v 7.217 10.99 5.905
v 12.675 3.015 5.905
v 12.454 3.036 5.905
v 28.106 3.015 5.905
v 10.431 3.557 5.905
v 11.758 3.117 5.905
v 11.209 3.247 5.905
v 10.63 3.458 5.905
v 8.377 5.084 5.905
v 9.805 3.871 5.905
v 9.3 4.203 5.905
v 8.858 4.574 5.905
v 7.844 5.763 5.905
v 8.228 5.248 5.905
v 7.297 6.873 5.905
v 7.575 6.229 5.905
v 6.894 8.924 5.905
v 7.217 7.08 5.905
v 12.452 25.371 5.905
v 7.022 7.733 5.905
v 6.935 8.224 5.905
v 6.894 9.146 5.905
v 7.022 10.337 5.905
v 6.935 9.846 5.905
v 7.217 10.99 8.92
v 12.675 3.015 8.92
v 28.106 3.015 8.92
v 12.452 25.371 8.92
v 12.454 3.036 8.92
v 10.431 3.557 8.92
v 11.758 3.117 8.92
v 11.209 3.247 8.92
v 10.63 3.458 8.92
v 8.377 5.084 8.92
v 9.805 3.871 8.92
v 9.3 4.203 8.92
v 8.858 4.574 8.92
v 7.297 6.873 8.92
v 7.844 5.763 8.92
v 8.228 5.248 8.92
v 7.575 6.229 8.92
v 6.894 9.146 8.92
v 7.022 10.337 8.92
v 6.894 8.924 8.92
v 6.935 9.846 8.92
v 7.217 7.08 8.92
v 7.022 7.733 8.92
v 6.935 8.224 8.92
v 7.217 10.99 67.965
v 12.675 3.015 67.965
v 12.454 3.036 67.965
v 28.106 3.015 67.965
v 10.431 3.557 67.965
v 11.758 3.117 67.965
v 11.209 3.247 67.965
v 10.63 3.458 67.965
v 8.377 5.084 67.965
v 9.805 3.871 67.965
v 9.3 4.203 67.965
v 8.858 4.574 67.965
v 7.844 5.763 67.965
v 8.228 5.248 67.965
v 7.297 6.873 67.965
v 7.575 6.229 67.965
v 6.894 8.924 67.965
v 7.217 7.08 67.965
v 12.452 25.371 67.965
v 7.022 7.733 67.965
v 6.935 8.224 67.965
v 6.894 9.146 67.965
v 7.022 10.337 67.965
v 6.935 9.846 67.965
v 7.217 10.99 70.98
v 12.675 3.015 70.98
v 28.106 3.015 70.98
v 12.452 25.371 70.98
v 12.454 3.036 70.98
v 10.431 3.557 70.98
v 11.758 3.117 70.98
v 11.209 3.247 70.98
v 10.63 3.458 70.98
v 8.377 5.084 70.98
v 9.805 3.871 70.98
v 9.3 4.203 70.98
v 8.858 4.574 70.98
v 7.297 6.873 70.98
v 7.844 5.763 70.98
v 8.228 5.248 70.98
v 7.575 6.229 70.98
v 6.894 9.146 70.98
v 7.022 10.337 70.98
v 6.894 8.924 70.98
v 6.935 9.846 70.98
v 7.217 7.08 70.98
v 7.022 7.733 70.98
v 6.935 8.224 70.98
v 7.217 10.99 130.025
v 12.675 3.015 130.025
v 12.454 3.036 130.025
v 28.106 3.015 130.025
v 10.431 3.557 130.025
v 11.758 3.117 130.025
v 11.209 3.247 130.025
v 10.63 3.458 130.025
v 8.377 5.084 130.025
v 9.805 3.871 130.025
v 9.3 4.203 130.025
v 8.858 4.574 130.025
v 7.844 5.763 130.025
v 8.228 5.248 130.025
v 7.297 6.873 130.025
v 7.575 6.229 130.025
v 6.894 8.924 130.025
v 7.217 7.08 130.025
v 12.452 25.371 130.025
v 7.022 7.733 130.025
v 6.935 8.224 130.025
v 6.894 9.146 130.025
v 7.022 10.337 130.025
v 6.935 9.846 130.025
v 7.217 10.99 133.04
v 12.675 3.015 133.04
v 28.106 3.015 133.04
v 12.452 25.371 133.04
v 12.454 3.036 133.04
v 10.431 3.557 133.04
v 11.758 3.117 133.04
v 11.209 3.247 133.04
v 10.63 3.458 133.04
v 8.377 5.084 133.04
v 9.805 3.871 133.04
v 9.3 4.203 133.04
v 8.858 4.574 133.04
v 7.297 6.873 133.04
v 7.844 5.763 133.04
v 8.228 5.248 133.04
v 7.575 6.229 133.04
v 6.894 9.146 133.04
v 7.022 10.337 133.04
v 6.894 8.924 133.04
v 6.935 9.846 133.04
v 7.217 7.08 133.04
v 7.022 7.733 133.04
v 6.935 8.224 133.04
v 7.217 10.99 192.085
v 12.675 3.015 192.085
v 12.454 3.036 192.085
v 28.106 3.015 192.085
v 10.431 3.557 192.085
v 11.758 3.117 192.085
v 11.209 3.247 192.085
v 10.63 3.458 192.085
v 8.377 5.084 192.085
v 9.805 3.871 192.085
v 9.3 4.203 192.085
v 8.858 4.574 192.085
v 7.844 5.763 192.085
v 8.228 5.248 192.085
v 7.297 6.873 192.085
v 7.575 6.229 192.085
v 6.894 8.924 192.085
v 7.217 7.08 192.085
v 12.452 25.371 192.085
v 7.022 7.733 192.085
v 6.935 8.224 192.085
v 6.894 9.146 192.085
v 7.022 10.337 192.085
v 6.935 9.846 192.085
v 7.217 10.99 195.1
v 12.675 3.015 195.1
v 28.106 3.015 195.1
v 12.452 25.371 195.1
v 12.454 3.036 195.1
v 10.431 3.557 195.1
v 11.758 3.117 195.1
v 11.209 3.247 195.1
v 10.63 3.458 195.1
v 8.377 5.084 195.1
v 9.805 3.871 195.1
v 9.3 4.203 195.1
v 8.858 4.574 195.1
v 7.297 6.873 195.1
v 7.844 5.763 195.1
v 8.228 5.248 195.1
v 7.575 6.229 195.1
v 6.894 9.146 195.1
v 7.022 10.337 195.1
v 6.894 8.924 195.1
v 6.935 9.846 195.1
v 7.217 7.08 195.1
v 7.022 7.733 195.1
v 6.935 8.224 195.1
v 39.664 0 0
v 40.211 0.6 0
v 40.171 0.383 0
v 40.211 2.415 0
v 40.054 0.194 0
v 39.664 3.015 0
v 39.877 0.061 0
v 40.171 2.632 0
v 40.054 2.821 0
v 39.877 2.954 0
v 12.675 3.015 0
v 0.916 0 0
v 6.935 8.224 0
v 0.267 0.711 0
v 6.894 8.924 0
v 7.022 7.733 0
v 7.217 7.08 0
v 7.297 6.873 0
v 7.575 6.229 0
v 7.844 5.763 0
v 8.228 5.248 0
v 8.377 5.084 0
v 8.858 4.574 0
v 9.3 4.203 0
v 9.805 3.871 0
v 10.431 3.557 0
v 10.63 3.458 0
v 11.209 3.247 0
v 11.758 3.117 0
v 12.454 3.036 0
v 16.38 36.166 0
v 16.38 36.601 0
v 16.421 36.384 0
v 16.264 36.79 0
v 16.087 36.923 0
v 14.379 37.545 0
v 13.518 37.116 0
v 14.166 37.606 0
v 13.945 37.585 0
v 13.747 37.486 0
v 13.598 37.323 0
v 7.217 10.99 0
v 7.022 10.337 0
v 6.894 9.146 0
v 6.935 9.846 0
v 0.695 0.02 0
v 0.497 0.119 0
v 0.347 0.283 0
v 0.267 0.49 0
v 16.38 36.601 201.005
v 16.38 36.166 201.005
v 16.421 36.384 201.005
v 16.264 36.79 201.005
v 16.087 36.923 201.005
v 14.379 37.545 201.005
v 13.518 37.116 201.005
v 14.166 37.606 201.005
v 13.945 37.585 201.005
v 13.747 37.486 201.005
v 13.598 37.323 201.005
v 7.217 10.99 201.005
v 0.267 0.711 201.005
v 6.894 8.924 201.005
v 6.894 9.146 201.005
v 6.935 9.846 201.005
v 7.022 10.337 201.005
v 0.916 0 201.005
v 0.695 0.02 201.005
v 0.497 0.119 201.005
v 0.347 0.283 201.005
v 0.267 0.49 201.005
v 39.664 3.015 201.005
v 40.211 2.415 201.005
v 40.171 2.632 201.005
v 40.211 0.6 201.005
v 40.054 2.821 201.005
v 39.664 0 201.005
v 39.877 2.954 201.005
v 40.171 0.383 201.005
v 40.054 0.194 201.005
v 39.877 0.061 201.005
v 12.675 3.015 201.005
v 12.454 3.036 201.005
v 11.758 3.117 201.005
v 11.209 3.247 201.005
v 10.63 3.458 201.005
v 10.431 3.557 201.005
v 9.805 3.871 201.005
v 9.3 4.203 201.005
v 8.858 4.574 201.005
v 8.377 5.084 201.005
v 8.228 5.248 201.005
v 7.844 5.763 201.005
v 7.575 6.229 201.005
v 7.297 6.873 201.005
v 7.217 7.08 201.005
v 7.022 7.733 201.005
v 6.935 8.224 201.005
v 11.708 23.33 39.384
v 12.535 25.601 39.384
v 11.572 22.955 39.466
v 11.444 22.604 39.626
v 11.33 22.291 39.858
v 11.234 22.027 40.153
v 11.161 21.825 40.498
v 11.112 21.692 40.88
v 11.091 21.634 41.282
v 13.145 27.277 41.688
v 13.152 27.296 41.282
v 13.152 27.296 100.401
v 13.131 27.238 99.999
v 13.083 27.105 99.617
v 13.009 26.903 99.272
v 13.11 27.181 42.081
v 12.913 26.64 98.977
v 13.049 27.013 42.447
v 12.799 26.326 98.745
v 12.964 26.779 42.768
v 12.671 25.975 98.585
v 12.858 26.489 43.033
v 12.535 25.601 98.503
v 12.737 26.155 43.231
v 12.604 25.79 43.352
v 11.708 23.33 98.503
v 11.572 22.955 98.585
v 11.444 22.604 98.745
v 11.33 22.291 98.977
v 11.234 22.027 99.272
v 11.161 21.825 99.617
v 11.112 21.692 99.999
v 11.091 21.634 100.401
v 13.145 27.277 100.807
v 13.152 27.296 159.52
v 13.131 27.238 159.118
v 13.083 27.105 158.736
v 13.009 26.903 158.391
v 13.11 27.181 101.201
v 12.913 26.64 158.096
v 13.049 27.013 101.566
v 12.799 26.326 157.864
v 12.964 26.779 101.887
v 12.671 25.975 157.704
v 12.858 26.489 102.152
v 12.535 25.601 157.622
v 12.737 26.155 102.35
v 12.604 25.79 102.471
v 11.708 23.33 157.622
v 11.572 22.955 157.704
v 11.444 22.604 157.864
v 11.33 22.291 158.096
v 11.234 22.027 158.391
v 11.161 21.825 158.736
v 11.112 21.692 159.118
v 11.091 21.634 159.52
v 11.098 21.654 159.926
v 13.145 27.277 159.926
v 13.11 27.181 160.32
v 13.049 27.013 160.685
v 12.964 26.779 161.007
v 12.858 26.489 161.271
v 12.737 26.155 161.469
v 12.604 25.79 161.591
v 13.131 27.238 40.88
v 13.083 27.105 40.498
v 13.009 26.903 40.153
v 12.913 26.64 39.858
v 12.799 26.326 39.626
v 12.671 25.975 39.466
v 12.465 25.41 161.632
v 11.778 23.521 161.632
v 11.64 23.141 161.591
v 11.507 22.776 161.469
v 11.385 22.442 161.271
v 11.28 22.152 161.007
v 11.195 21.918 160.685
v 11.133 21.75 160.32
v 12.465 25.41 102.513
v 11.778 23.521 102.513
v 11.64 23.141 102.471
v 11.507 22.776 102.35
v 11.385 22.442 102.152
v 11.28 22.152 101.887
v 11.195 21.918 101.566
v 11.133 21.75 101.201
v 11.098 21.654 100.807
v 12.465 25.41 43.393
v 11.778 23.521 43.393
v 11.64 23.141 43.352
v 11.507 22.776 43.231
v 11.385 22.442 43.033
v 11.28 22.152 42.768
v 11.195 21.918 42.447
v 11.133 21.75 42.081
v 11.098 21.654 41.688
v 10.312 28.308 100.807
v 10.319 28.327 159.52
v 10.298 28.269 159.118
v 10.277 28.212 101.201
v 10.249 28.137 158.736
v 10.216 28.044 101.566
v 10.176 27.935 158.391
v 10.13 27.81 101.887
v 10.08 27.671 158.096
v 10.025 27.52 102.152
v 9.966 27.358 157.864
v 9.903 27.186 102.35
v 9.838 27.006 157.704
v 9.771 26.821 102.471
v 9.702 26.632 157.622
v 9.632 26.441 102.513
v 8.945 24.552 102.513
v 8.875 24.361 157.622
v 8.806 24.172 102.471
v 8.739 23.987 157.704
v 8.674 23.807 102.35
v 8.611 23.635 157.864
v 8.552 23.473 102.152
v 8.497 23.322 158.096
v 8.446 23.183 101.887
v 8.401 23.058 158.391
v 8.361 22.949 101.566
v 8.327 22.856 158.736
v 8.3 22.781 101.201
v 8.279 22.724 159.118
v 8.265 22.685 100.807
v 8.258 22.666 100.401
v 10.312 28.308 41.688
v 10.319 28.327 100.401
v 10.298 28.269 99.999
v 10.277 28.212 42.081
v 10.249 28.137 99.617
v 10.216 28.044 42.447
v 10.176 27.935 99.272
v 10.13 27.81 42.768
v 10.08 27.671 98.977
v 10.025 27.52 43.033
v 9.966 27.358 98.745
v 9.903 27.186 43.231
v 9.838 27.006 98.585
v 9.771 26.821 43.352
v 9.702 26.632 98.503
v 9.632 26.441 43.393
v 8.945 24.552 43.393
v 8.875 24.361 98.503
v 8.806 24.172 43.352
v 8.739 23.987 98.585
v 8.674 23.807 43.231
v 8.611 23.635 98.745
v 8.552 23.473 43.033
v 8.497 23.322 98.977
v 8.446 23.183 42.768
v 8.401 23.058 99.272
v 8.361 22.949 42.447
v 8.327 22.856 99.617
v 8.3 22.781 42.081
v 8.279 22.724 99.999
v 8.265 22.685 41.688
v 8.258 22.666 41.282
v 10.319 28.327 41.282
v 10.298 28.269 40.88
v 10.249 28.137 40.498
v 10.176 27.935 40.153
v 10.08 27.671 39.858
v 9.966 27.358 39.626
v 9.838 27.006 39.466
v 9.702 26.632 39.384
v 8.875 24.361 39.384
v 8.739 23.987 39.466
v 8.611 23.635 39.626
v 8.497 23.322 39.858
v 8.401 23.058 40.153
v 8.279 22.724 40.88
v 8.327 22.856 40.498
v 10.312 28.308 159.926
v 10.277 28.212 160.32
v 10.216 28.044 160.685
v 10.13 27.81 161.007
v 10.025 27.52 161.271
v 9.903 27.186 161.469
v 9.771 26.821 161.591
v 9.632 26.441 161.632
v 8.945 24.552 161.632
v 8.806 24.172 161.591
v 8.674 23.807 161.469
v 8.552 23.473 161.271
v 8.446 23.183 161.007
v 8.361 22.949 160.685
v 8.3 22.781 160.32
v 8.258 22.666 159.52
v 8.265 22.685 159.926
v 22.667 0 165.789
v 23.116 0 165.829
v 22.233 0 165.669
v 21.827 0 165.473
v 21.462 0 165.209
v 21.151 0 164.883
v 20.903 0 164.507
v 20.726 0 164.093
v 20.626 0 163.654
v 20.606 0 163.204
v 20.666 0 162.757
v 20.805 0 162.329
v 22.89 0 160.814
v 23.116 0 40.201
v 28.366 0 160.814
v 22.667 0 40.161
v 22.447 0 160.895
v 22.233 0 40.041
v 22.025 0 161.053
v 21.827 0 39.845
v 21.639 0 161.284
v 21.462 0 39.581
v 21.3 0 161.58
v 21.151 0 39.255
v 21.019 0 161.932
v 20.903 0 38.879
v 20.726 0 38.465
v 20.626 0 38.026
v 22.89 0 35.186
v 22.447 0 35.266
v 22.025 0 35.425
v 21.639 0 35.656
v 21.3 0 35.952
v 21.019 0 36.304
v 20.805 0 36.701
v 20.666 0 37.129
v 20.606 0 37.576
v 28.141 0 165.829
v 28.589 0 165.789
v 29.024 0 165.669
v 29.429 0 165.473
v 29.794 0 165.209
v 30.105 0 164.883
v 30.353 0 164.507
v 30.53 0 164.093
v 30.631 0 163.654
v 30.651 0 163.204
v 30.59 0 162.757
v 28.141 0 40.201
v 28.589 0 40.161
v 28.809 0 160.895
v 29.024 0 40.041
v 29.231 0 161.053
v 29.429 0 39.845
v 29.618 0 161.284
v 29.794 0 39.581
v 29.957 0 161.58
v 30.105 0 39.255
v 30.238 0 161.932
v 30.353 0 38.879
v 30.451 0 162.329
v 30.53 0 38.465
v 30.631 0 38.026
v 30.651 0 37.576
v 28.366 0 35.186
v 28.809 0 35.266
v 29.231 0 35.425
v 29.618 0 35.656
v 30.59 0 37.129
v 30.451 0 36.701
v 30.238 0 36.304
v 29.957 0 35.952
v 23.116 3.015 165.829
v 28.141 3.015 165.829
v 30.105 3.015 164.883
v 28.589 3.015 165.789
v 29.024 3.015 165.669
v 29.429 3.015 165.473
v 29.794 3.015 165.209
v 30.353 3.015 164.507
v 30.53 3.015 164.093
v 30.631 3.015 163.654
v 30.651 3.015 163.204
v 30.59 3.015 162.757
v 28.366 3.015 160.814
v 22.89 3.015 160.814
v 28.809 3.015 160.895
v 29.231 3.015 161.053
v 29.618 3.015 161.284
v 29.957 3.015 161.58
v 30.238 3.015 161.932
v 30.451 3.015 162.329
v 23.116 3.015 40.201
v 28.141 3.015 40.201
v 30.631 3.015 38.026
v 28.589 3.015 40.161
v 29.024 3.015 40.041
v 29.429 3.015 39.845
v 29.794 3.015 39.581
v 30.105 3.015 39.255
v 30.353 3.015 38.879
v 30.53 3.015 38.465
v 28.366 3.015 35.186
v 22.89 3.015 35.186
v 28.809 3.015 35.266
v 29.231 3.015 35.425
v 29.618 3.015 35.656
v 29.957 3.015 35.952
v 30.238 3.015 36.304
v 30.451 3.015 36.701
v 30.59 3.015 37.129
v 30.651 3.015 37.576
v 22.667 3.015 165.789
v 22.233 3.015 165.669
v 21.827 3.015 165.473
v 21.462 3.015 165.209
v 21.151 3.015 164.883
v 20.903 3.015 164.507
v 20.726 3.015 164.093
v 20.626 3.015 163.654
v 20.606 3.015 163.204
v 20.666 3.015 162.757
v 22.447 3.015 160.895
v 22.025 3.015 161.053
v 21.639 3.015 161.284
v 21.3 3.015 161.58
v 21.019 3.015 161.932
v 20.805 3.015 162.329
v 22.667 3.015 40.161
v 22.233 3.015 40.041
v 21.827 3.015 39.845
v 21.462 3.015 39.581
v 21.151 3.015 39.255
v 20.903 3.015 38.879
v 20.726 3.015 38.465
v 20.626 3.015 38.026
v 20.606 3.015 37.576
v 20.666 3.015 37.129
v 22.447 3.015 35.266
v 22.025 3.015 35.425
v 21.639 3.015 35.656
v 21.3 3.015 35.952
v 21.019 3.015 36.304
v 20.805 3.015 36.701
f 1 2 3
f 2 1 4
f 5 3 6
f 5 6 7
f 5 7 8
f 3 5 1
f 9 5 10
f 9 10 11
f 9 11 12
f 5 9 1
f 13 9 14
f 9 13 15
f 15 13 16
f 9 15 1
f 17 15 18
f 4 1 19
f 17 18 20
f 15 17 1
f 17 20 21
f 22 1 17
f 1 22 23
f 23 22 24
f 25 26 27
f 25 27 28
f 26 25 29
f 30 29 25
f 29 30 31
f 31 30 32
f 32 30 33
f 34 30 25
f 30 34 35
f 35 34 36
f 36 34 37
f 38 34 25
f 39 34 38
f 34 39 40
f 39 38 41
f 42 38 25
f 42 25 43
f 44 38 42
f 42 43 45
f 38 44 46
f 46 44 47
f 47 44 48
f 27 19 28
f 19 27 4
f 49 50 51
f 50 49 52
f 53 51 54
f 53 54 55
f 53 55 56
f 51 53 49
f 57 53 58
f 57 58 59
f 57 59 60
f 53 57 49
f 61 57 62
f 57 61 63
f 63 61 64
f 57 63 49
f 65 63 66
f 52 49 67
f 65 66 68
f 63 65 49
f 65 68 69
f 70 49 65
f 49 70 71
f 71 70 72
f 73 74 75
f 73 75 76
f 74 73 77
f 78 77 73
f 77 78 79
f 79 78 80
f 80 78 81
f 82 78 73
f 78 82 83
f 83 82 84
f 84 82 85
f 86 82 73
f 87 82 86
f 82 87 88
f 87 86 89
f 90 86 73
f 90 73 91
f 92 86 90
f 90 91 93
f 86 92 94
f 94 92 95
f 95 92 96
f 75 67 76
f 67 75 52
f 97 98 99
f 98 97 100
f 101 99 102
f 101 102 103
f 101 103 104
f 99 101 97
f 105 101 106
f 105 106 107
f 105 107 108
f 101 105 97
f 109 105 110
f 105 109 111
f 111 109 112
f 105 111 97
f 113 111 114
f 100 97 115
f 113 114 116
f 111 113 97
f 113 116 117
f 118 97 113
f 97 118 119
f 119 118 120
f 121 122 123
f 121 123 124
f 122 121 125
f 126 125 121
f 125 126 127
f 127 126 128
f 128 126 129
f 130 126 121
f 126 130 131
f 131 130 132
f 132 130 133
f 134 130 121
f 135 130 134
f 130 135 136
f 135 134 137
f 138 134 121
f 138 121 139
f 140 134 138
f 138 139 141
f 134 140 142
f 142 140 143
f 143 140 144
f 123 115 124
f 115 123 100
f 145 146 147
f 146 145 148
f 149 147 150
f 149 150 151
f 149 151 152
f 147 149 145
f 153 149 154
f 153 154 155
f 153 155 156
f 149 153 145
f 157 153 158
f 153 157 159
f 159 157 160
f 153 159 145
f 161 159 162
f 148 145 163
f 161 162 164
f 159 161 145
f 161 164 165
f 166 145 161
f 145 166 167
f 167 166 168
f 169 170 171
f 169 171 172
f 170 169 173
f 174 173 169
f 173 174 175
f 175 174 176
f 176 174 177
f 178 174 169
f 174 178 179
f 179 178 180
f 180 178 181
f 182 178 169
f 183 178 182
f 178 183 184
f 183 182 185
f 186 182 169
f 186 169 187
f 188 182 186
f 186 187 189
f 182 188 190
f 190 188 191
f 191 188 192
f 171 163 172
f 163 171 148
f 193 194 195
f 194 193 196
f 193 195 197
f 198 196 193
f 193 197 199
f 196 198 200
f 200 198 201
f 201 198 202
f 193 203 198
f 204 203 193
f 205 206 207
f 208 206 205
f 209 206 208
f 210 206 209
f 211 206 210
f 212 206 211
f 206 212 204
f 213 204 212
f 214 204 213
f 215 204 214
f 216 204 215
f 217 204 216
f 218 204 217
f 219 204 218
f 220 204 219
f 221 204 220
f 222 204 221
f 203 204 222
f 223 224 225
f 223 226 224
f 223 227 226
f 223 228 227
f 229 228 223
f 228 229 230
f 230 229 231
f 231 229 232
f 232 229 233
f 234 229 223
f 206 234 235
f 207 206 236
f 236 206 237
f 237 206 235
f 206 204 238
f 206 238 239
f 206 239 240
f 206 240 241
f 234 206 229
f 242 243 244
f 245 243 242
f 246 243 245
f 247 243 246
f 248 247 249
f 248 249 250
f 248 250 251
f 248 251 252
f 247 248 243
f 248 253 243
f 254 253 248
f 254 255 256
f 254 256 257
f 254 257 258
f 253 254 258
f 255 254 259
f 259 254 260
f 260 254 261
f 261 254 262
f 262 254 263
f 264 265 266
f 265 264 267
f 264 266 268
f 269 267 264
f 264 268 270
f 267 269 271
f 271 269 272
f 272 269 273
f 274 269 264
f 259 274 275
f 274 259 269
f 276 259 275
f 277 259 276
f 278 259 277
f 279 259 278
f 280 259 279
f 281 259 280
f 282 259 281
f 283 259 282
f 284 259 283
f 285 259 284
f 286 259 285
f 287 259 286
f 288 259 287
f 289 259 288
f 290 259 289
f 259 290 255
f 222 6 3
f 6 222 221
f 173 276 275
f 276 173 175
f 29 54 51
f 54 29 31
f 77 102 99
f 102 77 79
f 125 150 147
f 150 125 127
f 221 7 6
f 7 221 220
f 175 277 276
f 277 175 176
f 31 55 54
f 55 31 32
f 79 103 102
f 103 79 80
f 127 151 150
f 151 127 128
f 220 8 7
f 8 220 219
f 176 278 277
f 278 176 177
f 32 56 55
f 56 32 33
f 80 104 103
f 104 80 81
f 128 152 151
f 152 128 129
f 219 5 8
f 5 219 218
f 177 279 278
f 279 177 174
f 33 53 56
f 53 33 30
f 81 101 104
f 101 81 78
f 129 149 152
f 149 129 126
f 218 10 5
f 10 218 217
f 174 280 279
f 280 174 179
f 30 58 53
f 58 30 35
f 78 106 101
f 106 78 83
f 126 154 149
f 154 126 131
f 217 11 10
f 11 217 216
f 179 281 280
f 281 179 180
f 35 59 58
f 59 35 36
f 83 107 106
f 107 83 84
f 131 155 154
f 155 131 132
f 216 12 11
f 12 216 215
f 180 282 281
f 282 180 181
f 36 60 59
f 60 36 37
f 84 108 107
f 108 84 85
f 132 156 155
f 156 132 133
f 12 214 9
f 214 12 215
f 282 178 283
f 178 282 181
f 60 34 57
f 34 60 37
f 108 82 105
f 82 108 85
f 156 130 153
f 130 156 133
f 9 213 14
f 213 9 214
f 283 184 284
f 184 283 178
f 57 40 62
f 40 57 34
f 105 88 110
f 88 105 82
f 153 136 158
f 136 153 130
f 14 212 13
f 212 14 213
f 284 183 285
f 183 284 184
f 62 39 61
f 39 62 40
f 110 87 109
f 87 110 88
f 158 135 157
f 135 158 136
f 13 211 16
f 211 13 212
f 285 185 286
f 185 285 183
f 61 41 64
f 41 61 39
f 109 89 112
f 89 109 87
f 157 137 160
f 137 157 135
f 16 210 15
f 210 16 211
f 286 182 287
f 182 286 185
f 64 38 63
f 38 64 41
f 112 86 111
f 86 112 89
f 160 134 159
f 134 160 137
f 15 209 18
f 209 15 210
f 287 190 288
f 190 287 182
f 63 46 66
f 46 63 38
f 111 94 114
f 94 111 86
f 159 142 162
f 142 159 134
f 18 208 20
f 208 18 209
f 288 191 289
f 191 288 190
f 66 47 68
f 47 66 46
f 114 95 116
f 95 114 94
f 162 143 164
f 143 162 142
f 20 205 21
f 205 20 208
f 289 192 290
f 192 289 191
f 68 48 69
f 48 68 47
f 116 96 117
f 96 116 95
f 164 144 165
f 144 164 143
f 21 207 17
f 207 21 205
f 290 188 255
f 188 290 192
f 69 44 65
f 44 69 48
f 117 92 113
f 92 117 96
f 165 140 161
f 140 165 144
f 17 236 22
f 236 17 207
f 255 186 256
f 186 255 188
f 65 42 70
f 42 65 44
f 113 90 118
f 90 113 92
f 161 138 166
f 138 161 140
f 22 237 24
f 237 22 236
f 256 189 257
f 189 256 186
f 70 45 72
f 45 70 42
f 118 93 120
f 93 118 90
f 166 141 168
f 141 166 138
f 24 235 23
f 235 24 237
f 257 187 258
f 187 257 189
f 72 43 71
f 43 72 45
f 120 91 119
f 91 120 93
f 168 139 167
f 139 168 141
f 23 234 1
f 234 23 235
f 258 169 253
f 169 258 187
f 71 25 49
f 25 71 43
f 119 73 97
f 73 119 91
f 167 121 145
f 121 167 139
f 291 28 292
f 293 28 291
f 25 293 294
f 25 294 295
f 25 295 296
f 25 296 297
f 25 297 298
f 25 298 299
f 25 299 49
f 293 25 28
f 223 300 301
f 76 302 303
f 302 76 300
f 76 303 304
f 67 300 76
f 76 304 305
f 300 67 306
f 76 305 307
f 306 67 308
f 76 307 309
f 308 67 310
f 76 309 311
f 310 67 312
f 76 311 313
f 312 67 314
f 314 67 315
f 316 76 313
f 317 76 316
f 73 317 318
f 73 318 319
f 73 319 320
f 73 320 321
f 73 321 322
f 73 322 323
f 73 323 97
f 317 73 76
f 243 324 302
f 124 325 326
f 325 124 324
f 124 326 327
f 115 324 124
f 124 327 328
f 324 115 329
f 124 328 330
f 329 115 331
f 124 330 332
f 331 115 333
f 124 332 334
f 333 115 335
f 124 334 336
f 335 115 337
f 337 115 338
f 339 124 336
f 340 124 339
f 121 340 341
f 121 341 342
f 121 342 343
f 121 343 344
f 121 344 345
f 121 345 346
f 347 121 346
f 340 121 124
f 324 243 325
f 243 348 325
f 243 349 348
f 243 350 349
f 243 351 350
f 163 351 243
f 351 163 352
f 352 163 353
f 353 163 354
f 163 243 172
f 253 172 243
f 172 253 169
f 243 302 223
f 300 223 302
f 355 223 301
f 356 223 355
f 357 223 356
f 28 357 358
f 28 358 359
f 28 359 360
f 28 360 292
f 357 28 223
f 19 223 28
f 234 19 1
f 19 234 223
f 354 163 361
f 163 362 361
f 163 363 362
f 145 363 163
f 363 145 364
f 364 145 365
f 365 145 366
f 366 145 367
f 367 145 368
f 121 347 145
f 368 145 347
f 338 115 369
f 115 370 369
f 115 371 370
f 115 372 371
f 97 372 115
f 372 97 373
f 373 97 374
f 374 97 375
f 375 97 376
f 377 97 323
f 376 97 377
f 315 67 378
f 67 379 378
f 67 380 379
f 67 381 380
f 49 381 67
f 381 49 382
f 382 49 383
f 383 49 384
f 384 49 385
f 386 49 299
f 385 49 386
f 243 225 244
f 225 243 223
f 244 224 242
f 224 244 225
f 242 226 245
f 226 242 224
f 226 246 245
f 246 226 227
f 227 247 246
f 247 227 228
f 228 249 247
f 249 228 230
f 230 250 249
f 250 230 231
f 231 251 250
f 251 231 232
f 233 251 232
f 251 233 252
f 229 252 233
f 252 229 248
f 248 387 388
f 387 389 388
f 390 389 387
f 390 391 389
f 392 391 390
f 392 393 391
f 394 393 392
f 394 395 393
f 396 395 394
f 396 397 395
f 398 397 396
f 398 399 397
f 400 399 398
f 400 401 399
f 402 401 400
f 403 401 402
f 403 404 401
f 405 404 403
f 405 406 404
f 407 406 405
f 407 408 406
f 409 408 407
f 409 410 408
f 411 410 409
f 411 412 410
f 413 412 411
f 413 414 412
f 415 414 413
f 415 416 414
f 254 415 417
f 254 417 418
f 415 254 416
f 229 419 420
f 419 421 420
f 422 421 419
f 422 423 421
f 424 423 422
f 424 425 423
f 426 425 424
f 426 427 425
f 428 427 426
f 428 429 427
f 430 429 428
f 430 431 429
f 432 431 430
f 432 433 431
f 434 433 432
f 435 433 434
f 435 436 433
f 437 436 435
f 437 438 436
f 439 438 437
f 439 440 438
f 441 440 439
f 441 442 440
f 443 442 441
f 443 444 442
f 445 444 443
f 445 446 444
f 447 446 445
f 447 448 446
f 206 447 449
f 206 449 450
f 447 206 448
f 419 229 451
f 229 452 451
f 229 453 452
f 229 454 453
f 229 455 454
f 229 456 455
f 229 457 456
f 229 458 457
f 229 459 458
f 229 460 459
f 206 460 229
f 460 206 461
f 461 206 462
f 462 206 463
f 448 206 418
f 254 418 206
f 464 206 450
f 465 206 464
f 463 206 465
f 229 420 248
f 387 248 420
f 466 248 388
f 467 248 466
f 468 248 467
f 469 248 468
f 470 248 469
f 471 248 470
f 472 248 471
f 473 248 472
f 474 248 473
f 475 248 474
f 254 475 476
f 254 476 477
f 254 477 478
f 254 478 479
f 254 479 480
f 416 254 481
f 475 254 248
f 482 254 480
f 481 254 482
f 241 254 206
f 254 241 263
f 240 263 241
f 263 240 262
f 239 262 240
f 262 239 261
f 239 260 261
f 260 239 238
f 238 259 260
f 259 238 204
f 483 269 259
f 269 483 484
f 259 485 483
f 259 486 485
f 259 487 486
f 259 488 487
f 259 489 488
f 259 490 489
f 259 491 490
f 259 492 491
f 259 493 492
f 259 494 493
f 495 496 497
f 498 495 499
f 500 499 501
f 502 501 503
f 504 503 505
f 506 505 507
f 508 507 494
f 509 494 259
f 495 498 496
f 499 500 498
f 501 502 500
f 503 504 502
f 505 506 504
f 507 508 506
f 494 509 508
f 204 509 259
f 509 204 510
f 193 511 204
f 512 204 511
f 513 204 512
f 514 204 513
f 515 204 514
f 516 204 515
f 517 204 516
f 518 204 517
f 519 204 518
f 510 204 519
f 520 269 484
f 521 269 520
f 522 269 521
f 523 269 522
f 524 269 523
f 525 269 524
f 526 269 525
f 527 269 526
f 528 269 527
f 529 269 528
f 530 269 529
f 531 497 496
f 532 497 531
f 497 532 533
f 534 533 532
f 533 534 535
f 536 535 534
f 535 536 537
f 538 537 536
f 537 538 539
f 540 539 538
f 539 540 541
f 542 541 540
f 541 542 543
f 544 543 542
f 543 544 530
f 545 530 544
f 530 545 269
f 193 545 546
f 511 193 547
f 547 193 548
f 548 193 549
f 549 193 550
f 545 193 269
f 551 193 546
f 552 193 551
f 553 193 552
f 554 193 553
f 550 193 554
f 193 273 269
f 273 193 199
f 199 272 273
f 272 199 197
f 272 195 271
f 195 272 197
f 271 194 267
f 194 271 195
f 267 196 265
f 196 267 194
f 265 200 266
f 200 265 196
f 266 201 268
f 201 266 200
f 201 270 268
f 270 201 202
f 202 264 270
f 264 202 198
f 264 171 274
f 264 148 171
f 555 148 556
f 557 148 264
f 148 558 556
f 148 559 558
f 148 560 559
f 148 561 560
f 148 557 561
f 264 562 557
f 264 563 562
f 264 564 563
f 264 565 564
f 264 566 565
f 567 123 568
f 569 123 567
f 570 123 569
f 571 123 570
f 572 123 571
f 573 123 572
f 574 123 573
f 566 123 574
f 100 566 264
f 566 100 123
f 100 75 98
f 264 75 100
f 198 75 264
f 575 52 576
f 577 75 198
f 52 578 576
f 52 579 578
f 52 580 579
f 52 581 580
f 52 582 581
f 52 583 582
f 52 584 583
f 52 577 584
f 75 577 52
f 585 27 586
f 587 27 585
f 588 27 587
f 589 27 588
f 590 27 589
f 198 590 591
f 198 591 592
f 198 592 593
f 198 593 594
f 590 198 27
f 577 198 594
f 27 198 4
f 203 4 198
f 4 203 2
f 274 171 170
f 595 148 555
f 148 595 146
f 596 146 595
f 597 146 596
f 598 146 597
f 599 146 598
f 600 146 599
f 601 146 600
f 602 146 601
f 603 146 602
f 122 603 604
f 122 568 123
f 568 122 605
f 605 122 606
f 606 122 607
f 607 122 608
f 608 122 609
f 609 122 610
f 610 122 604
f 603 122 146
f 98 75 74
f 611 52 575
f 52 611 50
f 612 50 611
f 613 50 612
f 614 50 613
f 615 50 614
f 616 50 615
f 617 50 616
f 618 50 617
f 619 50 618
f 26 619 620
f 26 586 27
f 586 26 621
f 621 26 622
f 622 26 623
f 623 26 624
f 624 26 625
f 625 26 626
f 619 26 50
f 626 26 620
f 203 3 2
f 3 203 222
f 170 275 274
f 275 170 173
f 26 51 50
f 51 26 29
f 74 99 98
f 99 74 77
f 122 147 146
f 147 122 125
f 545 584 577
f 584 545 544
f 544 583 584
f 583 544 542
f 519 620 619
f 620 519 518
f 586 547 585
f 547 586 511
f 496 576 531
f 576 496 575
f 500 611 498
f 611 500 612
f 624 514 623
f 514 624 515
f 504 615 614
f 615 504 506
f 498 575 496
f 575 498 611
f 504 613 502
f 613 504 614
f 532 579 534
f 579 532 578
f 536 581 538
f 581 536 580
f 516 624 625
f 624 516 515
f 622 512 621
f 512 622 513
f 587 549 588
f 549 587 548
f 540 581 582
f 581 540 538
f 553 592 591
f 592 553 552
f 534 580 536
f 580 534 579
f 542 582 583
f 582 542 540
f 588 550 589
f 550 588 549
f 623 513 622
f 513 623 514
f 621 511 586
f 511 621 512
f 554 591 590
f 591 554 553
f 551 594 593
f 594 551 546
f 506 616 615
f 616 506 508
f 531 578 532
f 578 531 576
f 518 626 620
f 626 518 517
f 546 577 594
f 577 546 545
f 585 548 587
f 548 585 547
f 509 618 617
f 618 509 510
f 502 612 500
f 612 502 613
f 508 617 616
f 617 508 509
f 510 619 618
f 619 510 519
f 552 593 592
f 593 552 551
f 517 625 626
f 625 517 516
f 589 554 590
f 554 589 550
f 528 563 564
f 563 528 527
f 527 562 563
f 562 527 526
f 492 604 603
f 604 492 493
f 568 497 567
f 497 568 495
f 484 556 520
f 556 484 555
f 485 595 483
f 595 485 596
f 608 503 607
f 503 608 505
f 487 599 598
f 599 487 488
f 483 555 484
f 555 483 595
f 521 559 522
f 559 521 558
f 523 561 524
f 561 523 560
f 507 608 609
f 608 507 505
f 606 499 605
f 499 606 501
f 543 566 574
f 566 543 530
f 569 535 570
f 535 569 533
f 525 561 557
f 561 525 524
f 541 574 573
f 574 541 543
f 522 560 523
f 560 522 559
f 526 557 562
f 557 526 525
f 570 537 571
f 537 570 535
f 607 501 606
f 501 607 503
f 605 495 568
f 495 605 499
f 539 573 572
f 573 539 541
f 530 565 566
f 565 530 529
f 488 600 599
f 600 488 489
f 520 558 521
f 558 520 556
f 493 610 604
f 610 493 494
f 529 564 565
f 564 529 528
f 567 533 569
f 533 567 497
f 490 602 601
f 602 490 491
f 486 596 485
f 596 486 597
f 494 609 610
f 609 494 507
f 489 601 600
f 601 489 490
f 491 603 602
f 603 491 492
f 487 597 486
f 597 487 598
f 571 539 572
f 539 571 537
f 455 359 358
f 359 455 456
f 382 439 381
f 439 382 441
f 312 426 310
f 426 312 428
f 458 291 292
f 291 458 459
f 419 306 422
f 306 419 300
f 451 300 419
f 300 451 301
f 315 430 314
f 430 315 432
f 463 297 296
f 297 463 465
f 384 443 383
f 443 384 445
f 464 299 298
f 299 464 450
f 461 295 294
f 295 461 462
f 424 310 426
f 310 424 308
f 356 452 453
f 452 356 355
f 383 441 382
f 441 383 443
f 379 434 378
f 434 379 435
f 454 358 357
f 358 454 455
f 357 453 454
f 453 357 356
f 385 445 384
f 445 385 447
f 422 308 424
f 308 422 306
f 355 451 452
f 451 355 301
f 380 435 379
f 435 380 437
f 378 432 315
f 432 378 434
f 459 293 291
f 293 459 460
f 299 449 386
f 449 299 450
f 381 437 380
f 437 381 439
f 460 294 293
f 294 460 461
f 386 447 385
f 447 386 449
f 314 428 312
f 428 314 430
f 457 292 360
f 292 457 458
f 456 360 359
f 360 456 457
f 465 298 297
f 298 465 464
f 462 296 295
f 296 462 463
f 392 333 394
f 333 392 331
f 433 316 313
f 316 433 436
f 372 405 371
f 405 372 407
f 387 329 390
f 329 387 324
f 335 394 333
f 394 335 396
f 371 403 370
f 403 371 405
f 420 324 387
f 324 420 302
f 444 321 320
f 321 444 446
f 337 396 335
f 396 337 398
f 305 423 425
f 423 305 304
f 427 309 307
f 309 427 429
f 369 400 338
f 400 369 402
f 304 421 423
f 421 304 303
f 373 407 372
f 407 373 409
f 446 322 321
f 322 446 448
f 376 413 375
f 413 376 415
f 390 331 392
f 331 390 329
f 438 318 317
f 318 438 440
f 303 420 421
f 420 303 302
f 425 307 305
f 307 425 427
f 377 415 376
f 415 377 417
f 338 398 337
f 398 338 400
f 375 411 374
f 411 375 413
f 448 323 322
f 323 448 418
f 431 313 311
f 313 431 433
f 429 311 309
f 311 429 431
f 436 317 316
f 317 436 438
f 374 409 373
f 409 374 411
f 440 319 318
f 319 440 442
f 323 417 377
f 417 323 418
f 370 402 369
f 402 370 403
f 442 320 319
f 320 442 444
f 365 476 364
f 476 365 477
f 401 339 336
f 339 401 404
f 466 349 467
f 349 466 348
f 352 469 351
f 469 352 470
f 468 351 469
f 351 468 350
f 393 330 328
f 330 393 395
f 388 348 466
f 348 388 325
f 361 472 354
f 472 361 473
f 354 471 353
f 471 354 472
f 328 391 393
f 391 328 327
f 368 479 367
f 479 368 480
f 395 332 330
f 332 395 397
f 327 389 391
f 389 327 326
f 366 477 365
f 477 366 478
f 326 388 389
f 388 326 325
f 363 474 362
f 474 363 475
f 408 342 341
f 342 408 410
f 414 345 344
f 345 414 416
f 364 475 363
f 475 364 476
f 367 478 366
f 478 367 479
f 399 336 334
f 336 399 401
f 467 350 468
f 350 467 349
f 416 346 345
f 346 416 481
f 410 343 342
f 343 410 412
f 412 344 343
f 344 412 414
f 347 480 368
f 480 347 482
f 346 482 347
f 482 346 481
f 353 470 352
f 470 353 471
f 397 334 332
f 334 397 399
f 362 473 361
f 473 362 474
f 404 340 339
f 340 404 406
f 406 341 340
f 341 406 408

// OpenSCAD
//------------------------------------------------------------------
/*

Angle Brackets

*/
//------------------------------------------------------------------
// Parameters

bracket_angle = 70;

bracket_length = 200;
arm1_length = 40;
arm2_length = 40;
wall_thickness = 3;

arm1_holes = 2;
arm1_hole_diameter = 5;
arm1_hole_spacing = 0.3;
arm1_hole_position = 0.7;
arm1_hole_elongation = 2.0;

arm2_holes = 3;
arm2_hole_diameter = 4;
arm2_hole_spacing = 0.7;
arm2_hole_position = 0.7;
arm2_hole_elongation = 1.0;

number_of_webs = 4;
web_size = 0.7;
web_spacing = 0.1;

fillet_factor = 2.0;
rounding_factor = 0.2;

//------------------------------------------------------------------
// Set the scaling value to compensate for print shrinkage

scale = 1/0.995; // ABS ~0.5% shrinkage
//scale = 1/0.998; // PLA ~0.2% shrinkage

function dim(x) = scale * x;

//------------------------------------------------------------------
// derived values

bracket_l = dim(bracket_length);
arm1 = dim(arm1_length);
arm2 = dim(arm2_length);
wall_t = dim(wall_thickness);
arm1_hole_r = dim(arm1_hole_diameter/2);
arm2_hole_r = dim(arm2_hole_diameter/2);

//------------------------------------------------------------------
// control the number of facets on cylinders

facet_epsilon = 0.01;
function facets(r) = 180 / acos(1 - (facet_epsilon / r));

// small tweak to avoid differencing artifacts
epsilon = 0.05;

//------------------------------------------------------------------
// rounded/filleted edges

module outset(d=1) {
  minkowski() {
    circle(r=d, $fn=facets(d));
    children(0);
  }
}

module inset(d=1) {
  render() inverse() outset(d=d) inverse() children(0);
}

module inverse() {
  difference() {
    square(1e5, center=true);
    children(0);
  }
}

module rounded(r=1) {
  outset(d=r) inset(d=r) children(0);
}

module filleted(r=1) {
  inset(d=r) render() outset(d=r) children(0);
}

//------------------------------------------------------------------

module hole(r) {
  cylinder(h=wall_t + (2 * epsilon), r = r, $fn=facets(r));
}

module hole_set(n, r, k, e) {
  space = bracket_l/(n - 1 + (2 * k));
  for (i = [1:n]) {
    translate([(k + i - 1) * space, 0, -epsilon]) {
      if (e != 0) {
        hull() {
          translate([0, e * r, 0]) hole(r);
          hole(r);
        }
      } else {
        hole(r);
      }
    }
  }
}

module holes() {
  if (arm1_holes > 0) {
    translate([arm1_hole_position * arm1,0,0]) rotate([-90,-90,0]) {
      hole_set(arm1_holes, arm1_hole_r, arm1_hole_spacing, -arm1_hole_elongation);
    }
  }
  if (arm2_holes > 0) {
    d = arm2_hole_position * arm2;
    c = cos(bracket_angle);
    s = sin(bracket_angle);
    translate([d * c, d * s, 0]) rotate([0,-90,90+bracket_angle]) {
      hole_set(arm2_holes, arm2_hole_r, arm2_hole_spacing, arm2_hole_elongation);
    }
  }
}

module web_profile() {
  c = cos(bracket_angle);
  s = sin(bracket_angle);
  d1 = arm1 * (1-web_size);
  d2 = arm2 * (1-web_size);
  wt = wall_t - epsilon;

  points = [
    [(c + 1) * wt/s, wt],
    [(c * arm2) + (s * wt) - (c * d2), (s * arm2) - (c * wt) - (s * d2)],
    [arm1 - d1, wt],
  ];
  polygon(points=points, convexity=2);
}

module web() {
  linear_extrude(height=wall_t) {
    web_profile();
  }
}

module webs() {
  space = (bracket_l - (number_of_webs * wall_t)) / (number_of_webs - 1 + (2 * web_spacing));
  for (i = [1:number_of_webs]) {
    translate([0, 0, (web_spacing * space) + (i - 1) * (space + wall_t)]) {
       web();
    }
  }
}

module bracket_profile() {
  c = cos(bracket_angle);
  s = sin(bracket_angle);
  d1 = arm1 * (1-web_size);
  d2 = arm2 * (1-web_size);
  points = [
    [arm1, wall_t],
    [arm1, 0],
    [0, 0],
    [c * arm2, s * arm2],
    [(c * arm2) + (s * wall_t), (s * arm2) - (c * wall_t)],
    [(c + 1) * wall_t/s, wall_t],
  ];
  rounded(rounding_factor * wall_t) filleted(fillet_factor * wall_t) polygon(points=points, convexity=2);
}

module bracket() {
  difference() {
    union() {
      linear_extrude(height=bracket_l) {
        bracket_profile();
      }
      if (number_of_webs > 0) {
        webs();
      }
    }
    holes();
  }
}

bracket();

//------------------------------------------------------------------
